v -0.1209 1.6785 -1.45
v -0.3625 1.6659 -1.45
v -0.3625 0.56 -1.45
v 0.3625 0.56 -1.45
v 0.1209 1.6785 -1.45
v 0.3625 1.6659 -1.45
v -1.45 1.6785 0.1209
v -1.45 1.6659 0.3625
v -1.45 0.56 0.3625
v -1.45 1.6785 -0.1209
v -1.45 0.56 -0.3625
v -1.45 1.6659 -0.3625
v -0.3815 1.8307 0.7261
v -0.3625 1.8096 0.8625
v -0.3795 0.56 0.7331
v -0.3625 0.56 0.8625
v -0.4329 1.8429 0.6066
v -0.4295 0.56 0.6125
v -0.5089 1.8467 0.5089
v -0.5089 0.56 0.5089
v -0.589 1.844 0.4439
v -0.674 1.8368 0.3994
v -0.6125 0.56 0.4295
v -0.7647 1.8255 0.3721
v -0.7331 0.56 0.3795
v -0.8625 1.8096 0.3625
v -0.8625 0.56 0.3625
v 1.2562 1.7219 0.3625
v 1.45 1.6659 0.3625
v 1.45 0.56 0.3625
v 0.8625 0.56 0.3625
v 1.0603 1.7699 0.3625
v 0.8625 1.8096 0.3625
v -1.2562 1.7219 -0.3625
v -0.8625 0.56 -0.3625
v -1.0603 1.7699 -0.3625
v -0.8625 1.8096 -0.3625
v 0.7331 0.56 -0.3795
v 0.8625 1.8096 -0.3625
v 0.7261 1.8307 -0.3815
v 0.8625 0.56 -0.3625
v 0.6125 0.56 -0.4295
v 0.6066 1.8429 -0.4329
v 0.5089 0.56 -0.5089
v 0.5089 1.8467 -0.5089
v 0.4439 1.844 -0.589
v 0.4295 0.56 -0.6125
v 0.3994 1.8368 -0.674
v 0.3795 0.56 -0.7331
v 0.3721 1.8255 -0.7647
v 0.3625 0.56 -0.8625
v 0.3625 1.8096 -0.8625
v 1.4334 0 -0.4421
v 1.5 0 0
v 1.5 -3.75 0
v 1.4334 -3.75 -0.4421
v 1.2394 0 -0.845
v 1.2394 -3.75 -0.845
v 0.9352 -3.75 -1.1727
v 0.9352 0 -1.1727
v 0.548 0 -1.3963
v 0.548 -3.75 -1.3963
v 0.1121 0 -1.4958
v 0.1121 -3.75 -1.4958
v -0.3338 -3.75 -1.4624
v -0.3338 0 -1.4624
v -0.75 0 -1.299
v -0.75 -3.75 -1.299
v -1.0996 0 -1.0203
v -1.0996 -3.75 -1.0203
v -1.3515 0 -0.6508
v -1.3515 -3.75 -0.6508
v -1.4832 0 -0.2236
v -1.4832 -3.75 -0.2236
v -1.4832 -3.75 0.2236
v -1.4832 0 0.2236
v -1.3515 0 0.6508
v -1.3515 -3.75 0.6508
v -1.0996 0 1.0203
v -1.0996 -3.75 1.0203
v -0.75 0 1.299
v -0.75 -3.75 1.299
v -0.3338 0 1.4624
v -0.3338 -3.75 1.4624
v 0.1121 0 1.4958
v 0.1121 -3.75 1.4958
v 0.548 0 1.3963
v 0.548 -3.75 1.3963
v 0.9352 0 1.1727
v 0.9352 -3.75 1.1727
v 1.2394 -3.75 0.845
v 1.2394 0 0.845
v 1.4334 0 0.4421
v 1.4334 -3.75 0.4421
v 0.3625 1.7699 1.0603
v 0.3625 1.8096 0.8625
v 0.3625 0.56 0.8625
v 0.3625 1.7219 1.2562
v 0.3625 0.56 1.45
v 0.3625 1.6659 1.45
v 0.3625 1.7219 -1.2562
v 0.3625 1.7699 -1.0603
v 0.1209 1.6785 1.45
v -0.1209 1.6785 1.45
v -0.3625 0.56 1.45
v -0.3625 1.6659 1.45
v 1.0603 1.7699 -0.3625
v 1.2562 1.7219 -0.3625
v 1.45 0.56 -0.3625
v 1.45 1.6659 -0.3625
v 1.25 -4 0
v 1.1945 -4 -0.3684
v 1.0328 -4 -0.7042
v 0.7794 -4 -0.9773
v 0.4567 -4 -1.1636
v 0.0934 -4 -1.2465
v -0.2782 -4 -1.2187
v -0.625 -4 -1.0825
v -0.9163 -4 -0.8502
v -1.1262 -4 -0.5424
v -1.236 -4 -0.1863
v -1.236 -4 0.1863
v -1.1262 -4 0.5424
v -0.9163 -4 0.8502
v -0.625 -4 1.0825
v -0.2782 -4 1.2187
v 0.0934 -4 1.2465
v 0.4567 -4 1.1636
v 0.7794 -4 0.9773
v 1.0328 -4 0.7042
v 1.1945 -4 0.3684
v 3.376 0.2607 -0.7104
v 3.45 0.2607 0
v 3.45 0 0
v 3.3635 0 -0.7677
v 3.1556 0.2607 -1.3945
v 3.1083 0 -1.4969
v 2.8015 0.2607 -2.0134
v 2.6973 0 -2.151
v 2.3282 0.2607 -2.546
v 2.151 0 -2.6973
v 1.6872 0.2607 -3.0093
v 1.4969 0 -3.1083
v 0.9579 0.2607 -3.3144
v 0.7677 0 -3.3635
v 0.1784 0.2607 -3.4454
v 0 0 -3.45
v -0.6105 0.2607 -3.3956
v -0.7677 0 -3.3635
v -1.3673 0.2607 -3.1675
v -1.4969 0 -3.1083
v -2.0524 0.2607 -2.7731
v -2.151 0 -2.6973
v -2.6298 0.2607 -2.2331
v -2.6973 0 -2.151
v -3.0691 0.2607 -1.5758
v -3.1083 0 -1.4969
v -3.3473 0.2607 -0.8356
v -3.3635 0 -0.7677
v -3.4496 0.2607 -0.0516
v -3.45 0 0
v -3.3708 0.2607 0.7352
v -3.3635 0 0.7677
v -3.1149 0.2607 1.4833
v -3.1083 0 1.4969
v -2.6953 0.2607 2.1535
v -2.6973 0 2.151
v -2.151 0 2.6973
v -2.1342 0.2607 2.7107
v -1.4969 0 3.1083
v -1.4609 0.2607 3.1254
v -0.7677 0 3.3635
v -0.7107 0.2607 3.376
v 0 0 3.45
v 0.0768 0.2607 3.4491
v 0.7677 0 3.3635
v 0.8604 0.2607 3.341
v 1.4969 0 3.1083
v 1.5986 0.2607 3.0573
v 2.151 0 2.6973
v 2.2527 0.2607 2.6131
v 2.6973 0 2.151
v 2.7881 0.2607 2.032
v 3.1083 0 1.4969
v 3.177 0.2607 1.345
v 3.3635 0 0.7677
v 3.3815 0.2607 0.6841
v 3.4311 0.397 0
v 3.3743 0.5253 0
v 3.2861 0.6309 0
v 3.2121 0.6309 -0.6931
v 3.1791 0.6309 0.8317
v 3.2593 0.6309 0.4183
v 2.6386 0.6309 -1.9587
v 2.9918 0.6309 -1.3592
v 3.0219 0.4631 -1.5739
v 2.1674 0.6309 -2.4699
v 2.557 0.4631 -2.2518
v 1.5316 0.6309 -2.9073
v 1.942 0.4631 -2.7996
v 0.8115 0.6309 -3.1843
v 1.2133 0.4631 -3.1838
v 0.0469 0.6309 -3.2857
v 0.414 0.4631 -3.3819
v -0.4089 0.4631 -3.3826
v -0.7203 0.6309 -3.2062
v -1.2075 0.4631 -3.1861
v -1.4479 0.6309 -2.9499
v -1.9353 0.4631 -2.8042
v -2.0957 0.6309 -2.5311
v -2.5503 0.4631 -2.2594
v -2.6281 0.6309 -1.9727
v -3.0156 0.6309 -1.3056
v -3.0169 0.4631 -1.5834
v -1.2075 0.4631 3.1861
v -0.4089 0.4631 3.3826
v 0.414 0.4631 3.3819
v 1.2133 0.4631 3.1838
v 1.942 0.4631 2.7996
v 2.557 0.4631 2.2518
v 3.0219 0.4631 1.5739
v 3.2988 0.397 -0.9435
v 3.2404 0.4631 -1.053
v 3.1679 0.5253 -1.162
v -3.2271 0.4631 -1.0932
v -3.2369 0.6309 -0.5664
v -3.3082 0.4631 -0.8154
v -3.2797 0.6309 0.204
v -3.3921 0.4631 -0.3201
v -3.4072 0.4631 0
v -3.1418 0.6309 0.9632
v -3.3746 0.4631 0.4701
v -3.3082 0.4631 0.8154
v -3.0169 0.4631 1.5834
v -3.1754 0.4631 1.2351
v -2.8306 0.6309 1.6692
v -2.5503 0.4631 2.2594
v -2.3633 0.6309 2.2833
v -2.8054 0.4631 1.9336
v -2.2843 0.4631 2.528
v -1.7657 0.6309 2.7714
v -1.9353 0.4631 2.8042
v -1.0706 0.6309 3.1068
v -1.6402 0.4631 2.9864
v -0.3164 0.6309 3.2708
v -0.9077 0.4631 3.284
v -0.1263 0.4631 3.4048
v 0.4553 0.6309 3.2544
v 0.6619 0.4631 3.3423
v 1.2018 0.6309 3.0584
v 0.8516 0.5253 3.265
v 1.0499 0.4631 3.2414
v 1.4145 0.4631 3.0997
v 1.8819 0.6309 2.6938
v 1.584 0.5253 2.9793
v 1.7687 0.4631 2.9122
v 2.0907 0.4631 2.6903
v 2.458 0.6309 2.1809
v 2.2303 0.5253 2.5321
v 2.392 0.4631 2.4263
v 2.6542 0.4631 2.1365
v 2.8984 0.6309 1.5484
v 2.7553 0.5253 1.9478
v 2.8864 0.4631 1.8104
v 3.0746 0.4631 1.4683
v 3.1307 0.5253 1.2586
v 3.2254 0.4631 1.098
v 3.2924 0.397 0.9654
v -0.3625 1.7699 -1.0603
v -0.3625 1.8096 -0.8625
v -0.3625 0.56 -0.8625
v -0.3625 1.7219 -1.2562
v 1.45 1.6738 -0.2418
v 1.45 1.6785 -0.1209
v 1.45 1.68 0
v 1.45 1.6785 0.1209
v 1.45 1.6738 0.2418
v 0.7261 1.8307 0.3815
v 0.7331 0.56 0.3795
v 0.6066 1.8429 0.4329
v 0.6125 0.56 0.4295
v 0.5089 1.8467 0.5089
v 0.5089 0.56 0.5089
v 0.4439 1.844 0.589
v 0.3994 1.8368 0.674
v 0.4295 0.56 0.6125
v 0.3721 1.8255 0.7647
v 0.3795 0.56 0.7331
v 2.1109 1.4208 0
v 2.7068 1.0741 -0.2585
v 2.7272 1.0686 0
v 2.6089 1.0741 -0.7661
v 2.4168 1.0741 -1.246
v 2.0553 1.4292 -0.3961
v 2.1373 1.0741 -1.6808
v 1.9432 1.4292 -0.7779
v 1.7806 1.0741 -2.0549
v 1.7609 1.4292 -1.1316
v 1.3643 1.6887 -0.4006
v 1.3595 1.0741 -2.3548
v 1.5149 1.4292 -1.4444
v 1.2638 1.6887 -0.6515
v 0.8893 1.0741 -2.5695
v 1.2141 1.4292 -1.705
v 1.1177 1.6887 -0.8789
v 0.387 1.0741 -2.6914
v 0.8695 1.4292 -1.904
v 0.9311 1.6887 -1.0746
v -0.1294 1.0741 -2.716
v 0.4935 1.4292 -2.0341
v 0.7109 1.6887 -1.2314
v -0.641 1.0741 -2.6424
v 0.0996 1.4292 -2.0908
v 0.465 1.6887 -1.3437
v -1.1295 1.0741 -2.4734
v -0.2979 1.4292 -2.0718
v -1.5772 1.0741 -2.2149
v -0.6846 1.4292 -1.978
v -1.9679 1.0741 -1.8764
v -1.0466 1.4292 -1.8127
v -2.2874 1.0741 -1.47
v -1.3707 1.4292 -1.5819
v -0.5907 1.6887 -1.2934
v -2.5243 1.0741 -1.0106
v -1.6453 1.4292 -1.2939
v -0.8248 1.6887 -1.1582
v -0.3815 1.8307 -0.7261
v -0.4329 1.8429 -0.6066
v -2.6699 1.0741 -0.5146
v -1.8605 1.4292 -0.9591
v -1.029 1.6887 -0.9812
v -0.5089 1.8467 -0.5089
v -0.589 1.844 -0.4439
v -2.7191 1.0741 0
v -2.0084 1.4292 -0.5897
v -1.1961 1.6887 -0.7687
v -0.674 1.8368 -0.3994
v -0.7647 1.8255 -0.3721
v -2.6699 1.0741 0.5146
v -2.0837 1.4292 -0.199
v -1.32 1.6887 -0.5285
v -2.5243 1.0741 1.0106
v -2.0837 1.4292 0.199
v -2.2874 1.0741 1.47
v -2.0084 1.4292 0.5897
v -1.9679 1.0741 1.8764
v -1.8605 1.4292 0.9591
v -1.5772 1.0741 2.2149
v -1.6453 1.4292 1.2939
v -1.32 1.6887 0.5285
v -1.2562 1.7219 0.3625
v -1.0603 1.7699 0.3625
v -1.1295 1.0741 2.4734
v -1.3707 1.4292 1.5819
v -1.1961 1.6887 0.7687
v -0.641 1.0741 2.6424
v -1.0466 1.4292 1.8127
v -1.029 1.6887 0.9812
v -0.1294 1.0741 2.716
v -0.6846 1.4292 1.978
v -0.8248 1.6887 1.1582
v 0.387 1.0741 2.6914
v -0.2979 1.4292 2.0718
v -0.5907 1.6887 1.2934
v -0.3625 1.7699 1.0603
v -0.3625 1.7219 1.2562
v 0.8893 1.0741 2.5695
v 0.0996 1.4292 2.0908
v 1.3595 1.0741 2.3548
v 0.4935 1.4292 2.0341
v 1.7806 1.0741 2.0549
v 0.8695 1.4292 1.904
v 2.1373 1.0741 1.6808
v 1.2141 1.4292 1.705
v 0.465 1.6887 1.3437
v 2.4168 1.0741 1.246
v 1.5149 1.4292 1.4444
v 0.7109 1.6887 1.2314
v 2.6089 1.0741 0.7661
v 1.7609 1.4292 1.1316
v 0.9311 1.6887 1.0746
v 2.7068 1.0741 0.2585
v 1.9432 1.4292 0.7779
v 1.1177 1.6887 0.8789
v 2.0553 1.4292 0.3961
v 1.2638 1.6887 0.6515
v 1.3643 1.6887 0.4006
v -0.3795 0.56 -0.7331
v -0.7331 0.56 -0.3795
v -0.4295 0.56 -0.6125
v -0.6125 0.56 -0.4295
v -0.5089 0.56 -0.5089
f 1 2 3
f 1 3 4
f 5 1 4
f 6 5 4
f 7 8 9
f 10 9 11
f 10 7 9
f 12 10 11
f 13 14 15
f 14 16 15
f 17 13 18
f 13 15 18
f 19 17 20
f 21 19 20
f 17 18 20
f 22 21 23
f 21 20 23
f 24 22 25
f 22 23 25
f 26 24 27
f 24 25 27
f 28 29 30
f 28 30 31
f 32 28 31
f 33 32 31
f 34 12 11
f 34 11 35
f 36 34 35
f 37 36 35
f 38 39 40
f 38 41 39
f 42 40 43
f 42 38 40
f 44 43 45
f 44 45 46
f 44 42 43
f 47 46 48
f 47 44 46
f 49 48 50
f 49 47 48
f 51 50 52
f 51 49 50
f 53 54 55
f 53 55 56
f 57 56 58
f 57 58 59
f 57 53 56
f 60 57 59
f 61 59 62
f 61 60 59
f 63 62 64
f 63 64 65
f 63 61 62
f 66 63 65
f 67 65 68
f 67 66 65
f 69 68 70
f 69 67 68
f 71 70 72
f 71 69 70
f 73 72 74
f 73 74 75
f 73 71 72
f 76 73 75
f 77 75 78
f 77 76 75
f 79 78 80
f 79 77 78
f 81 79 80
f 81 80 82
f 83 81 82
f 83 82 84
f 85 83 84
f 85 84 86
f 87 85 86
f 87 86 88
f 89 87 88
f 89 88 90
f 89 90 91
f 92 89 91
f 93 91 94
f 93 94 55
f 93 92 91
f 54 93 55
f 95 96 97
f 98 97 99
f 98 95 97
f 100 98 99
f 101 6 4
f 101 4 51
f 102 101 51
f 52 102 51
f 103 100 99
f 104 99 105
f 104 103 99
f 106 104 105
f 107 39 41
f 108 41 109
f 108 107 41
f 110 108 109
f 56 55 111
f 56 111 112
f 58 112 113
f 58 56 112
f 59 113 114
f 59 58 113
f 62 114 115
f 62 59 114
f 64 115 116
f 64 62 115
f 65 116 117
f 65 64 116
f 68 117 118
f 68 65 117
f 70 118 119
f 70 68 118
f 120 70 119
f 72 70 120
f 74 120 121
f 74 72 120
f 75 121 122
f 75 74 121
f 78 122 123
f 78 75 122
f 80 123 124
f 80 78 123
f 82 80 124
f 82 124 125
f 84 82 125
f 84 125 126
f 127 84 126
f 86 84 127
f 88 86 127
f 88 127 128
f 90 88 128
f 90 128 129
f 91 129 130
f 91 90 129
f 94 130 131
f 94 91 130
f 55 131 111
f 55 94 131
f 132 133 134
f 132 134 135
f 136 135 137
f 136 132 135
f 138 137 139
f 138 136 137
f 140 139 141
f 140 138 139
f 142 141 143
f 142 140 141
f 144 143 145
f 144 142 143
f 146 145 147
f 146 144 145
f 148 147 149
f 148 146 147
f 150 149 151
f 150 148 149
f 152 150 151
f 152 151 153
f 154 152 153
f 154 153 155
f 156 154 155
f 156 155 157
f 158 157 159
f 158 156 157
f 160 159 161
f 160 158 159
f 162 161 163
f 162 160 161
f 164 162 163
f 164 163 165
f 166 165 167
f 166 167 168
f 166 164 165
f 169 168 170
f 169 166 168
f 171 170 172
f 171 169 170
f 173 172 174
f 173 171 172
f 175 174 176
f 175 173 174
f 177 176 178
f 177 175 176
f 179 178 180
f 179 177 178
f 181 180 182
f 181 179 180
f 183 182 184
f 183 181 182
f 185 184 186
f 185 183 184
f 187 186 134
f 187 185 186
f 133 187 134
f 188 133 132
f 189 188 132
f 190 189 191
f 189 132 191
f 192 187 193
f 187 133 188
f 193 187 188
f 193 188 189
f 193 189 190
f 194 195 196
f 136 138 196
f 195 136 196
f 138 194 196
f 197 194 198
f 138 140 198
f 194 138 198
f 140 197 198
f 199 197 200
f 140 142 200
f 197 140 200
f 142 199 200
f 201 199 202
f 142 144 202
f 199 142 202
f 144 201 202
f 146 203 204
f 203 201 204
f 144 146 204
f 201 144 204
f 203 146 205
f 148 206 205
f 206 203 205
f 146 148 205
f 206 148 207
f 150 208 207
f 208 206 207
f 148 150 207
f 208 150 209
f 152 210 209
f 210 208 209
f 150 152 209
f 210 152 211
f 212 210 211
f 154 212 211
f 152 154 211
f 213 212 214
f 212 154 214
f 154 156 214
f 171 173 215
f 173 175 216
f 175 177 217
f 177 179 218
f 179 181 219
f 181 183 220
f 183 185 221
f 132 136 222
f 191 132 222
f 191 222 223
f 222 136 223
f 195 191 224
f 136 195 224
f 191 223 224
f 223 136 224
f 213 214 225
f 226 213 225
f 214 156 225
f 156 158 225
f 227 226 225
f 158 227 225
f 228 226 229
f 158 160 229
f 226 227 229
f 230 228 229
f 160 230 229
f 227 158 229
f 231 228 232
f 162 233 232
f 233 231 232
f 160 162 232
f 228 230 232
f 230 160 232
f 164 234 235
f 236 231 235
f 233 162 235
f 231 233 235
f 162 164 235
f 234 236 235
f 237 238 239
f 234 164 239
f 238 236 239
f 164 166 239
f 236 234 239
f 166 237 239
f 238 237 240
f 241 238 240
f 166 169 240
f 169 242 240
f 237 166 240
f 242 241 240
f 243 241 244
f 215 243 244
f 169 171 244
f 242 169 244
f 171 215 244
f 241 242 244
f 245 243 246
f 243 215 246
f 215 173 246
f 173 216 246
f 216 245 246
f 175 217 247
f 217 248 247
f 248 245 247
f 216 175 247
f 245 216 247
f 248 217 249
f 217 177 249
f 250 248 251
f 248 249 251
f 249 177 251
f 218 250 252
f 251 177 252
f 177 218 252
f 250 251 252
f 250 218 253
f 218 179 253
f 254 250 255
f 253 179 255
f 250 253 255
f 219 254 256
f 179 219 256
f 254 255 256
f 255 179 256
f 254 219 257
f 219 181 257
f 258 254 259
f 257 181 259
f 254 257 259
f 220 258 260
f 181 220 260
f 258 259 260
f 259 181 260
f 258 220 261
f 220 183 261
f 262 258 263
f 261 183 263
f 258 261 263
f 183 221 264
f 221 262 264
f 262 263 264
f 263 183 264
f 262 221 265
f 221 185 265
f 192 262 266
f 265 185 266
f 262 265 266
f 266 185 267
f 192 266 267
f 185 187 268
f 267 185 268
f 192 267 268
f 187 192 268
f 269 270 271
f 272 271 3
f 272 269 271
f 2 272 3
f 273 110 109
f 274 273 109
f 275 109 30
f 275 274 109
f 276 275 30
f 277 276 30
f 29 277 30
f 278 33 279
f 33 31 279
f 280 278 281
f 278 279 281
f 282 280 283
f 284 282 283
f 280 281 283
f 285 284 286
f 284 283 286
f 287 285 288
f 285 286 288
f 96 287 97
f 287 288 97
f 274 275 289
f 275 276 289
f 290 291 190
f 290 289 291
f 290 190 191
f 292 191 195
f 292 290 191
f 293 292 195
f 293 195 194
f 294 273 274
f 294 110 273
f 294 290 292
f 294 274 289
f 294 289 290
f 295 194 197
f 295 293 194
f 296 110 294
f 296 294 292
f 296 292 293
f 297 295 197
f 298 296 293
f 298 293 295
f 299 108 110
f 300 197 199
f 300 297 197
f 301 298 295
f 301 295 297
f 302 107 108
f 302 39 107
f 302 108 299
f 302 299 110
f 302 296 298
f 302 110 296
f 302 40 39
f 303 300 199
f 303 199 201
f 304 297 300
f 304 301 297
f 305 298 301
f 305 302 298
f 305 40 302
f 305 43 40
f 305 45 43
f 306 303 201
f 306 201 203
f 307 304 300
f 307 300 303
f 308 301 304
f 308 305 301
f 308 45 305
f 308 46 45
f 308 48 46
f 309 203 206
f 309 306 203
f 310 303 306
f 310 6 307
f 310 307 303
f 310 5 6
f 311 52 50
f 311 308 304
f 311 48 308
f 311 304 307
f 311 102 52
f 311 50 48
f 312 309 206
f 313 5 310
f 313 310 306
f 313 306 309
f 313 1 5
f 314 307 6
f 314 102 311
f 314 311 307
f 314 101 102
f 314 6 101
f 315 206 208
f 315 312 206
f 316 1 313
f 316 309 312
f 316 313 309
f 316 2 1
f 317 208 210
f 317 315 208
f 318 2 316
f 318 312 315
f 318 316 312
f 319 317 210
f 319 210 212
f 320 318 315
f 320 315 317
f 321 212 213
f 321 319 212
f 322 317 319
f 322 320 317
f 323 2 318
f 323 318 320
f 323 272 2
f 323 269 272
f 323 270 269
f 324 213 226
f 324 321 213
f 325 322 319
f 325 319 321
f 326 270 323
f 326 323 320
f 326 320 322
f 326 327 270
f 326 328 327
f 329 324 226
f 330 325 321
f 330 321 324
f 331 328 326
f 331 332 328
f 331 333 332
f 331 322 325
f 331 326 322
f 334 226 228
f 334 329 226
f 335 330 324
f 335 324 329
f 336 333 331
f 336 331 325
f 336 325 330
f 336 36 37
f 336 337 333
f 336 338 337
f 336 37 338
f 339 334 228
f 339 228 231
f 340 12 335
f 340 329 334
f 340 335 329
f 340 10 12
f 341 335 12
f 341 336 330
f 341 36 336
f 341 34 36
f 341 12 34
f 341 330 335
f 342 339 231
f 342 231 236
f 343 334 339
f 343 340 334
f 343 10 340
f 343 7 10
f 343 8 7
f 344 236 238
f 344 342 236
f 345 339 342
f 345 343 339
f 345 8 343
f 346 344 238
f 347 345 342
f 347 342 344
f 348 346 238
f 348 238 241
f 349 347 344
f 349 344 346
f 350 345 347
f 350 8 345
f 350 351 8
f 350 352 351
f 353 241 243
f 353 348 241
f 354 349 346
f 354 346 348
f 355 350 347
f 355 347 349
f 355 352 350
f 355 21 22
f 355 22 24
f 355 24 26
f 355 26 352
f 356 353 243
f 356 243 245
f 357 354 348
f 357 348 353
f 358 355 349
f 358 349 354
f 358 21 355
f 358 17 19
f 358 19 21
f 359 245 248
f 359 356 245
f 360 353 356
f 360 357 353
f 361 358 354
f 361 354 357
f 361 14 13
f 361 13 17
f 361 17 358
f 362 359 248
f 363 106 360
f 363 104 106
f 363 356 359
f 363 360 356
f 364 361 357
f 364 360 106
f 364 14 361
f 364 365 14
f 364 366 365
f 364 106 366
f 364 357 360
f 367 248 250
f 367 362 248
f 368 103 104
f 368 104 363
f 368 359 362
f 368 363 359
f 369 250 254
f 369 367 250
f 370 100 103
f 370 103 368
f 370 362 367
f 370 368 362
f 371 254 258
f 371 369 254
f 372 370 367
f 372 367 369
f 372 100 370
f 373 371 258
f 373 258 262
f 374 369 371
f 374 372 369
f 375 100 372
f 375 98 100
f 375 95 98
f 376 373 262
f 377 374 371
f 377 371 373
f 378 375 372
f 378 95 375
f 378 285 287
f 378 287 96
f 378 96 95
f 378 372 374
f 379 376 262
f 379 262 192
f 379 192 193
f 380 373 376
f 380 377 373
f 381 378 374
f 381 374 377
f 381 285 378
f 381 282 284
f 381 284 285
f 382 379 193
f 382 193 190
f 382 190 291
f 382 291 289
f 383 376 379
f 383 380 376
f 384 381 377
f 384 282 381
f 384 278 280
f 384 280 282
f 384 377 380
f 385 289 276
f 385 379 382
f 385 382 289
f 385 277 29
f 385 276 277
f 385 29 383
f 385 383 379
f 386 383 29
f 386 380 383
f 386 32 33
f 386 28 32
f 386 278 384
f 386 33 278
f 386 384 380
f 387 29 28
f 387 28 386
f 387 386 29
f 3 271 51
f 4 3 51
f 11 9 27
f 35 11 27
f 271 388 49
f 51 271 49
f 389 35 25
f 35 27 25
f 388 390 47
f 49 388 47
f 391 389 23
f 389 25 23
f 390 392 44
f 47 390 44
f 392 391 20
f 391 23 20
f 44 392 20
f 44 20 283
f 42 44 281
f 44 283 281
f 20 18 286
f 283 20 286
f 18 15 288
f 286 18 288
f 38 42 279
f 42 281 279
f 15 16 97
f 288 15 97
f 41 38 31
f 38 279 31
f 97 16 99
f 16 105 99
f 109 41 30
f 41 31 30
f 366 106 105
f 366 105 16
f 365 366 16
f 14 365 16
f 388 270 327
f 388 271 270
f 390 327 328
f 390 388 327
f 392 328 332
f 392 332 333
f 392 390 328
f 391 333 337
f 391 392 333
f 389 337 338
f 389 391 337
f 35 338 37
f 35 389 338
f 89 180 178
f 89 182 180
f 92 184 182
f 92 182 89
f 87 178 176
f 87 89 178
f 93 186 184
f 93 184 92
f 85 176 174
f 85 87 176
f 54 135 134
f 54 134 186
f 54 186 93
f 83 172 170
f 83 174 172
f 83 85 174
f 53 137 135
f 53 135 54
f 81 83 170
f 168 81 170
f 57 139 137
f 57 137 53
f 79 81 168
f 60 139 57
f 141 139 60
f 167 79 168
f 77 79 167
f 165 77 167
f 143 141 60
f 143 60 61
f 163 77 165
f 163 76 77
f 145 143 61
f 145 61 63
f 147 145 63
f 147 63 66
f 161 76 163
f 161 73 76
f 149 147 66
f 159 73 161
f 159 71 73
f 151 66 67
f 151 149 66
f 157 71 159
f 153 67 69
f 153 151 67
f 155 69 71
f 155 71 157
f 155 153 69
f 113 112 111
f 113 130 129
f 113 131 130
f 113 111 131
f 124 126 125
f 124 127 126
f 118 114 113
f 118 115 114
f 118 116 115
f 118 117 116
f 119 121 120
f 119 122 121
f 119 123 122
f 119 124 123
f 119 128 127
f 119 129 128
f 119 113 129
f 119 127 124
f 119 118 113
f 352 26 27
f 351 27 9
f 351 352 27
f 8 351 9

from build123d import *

# Parameters (mm, degrees)
CUT_EXTRUDE1_DEPTH = 1.34
CHAMFER1_SIZE      = 0.25
FILLET1_R          = 0.5
FILLET2_R          = 0.5


with BuildPart() as part:
    # Sketch1 → Revolve1 (revolve)
    with BuildSketch(Plane.XY):
        with BuildLine():
            Line((0, -4), (1.5, -4))
            Line((1.5, -4), (1.5, 0))
            Line((1.5, 0), (3.45, 0))
            Line((3.45, 0), (3.45, 0.475))
            ThreePointArc((3.45, 0.475), (1.866355071, 1.529728066), (0, 1.9))
            Line((0, 1.9), (0, -4))
        make_face()
    revolve(axis=Axis((0, -2.988815789, 0), (0, 1, 0)))

    # Sketch3 → Cut-Extrude1 (cut)
    with BuildSketch(Plane(origin=(0, 1.9, 0), x_dir=(-1, 0, 0), z_dir=(0, 1, 0))):
        Polygon((-0.3625, 1.45), (0.3625, 1.45), (0.3625, 0.3625), (1.45, 0.3625), (1.45, -0.3625), (0.3625, -0.3625), (0.3625, -1.45), (-0.3625, -1.45), (-0.3625, -0.3625), (-1.45, -0.3625), (-1.45, 0.3625), (-0.3625, 0.3625), align=None)
    extrude(amount=-CUT_EXTRUDE1_DEPTH, mode=Mode.SUBTRACT)

    # Chamfer1
    chamfer1_edges = [part.edges().sort_by_distance(p)[0] for p in [
        (-1.5, -4, 0),
    ]]
    chamfer(chamfer1_edges, length=CHAMFER1_SIZE)

    # Fillet1
    fillet1_edges = [part.edges().sort_by_distance(p)[0] for p in [
        (-3.45, 0.475, 0),
    ]]
    fillet(fillet1_edges, radius=FILLET1_R)

    # Fillet2
    fillet2_edges = [part.edges().sort_by_distance(p)[0] for p in [
        (0.3625, 1.216523373, 0.3625),
        (-0.3625, 1.216523373, 0.3625),
        (-0.3625, 1.216523373, -0.3625),
        (0.3625, 1.216523373, -0.3625),
    ]]
    fillet(fillet2_edges, radius=FILLET2_R)


solid = part.part
